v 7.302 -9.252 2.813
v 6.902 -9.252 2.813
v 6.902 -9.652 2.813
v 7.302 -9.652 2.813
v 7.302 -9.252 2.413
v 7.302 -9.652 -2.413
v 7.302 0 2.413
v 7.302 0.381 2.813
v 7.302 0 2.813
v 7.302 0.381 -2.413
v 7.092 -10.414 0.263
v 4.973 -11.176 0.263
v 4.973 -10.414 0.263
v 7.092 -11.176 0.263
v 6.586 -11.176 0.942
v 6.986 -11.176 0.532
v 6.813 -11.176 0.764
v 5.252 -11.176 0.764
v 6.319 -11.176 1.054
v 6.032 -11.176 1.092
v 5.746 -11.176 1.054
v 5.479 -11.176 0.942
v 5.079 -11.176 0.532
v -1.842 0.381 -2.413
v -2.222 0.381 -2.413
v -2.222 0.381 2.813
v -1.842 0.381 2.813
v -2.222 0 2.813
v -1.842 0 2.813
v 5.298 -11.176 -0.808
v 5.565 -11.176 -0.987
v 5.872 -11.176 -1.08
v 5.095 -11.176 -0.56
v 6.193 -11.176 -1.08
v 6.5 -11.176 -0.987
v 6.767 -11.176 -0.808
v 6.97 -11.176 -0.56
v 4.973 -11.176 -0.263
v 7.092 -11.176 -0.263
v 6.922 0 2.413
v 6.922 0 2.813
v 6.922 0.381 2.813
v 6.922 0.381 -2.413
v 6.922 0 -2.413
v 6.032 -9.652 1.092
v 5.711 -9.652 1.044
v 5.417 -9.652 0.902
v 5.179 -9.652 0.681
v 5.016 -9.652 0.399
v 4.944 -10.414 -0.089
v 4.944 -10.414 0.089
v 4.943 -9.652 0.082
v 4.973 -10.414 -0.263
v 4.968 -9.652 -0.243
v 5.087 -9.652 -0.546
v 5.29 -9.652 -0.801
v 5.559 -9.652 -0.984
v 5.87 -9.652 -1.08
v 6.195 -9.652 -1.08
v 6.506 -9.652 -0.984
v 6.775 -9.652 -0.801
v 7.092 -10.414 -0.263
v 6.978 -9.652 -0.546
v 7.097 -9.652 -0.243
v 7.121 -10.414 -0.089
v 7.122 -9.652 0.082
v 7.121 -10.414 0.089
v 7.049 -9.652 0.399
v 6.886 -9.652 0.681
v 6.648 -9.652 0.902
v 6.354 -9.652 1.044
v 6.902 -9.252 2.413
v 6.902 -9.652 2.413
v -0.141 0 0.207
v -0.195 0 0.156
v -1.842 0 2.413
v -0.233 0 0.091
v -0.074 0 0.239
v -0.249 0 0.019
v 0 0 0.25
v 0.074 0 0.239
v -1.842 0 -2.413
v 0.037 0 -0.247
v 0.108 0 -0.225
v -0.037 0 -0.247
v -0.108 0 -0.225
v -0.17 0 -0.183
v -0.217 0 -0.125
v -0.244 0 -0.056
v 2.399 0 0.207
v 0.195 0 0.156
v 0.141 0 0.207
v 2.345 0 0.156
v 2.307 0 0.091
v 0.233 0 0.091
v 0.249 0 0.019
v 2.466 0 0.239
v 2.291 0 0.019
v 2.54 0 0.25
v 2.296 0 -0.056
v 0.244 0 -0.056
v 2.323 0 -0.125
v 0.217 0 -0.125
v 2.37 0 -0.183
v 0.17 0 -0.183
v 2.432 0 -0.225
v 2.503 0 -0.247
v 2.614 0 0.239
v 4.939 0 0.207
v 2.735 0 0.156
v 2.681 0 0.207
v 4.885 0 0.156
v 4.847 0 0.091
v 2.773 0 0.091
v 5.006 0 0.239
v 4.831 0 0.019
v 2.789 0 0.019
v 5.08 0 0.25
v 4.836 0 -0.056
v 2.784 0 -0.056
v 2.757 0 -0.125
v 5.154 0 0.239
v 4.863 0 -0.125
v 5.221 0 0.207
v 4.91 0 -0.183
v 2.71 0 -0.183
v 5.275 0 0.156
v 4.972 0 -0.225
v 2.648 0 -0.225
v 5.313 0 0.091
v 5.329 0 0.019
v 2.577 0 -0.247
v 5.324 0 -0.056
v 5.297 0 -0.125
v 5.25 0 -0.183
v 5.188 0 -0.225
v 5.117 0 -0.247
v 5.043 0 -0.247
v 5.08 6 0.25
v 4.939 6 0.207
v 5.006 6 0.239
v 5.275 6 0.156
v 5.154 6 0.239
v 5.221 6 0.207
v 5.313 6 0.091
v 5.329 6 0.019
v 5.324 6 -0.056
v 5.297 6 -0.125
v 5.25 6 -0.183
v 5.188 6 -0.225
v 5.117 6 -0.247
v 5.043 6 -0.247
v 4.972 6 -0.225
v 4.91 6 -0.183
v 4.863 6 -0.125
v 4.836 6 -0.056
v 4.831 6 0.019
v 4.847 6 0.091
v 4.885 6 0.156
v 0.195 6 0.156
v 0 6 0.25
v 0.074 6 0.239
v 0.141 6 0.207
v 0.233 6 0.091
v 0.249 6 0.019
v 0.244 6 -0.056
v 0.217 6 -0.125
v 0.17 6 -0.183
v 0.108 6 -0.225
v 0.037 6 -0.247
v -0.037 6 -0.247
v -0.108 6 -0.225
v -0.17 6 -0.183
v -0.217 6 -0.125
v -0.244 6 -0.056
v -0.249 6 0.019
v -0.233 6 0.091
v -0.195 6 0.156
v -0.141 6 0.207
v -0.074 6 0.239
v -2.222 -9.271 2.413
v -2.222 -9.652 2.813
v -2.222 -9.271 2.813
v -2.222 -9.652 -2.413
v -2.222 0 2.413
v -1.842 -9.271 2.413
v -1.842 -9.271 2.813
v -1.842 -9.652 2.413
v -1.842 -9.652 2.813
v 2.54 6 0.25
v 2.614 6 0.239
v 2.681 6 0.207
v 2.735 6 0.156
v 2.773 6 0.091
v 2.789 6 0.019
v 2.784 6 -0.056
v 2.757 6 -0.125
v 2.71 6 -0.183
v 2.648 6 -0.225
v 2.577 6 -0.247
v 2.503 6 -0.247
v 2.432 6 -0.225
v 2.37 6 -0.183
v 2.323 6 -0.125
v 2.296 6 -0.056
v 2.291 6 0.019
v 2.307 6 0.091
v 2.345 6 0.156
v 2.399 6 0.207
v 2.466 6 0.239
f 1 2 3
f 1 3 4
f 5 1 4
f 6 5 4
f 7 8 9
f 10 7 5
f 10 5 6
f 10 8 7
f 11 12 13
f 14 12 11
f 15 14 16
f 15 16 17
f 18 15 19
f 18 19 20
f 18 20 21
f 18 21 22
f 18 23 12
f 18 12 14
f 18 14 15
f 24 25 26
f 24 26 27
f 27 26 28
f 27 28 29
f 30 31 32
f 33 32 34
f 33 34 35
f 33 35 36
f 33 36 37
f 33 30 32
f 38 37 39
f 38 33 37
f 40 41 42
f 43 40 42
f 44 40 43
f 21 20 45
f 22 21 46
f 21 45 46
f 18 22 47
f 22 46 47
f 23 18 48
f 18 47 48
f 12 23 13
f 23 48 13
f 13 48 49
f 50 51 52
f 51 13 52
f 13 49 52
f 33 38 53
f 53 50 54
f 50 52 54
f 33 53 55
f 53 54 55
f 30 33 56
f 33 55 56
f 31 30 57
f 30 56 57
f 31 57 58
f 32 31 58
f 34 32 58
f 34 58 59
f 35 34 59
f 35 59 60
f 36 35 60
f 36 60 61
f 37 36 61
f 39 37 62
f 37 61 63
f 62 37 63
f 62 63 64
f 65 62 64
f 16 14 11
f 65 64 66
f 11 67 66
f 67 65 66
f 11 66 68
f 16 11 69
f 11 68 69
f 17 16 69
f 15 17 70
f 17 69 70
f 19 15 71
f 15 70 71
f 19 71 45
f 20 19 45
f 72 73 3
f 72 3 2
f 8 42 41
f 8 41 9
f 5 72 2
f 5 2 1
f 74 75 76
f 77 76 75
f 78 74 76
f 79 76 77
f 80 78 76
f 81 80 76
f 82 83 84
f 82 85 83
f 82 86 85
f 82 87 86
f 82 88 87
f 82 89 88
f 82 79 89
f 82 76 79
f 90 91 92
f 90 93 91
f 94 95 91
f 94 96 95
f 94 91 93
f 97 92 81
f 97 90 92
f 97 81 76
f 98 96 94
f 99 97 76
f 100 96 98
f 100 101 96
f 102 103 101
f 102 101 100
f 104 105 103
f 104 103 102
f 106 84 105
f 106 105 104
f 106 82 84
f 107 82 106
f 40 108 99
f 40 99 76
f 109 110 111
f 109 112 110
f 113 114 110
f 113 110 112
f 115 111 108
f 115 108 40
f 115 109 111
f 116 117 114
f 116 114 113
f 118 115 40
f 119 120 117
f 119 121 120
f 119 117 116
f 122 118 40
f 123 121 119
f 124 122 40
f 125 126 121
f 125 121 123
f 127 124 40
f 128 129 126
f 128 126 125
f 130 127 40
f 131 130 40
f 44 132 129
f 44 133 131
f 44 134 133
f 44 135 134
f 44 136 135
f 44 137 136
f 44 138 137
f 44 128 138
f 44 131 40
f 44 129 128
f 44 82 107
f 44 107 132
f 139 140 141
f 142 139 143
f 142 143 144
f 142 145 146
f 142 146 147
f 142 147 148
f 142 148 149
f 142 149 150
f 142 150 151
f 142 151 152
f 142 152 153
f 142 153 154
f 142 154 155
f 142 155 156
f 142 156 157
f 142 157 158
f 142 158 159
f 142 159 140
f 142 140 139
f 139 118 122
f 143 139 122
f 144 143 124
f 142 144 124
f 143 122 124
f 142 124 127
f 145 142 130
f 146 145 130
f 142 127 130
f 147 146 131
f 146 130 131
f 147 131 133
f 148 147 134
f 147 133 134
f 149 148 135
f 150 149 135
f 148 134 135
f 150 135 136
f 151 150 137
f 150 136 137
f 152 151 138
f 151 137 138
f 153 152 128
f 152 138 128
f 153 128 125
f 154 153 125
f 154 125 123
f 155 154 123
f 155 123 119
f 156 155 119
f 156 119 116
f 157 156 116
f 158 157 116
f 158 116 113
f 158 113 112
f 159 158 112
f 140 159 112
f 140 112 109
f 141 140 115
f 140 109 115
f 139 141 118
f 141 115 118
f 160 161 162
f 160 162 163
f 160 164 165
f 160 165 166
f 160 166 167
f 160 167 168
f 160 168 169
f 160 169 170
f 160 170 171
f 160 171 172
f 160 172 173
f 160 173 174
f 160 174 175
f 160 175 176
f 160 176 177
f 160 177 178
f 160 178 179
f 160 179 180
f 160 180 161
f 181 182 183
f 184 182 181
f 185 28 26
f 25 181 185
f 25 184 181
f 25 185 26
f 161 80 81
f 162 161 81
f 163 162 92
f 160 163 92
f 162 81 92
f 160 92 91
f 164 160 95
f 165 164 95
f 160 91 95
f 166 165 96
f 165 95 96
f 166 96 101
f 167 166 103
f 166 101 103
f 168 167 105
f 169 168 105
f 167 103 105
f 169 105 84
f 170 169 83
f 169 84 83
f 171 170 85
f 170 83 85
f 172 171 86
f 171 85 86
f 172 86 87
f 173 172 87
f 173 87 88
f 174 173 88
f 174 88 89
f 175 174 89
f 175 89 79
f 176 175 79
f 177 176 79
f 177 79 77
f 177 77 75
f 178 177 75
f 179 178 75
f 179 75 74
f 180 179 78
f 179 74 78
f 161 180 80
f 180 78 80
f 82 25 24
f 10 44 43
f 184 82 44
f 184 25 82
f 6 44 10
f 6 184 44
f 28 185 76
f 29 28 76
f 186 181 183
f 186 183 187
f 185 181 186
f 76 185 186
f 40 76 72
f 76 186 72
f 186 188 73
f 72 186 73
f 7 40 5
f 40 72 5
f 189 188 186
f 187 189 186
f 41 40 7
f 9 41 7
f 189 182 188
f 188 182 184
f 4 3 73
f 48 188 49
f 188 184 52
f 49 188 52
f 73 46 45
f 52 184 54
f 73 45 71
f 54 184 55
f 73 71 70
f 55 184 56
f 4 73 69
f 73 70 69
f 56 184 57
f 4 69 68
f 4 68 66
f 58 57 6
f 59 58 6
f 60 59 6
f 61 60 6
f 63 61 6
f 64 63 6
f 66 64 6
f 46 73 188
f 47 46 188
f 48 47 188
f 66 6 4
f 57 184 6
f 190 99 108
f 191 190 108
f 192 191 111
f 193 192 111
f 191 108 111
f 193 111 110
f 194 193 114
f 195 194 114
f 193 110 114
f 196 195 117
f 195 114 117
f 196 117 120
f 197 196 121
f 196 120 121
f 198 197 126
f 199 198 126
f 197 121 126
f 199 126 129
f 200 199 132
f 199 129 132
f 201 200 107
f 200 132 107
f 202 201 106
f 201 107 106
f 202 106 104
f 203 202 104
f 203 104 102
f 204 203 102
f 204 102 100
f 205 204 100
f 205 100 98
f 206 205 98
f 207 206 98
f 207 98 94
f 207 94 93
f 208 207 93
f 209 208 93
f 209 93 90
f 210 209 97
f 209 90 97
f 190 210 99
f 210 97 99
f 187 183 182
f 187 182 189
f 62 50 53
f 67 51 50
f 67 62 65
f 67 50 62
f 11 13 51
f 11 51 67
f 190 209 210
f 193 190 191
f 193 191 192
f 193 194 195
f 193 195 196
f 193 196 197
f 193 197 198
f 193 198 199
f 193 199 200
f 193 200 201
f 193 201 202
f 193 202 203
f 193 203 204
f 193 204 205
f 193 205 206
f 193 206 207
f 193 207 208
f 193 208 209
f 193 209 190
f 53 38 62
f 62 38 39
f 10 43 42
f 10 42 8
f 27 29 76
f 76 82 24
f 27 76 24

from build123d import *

# Parameters (mm, degrees)
CROQUIS1_R                = 0.25
SALIENTE_EXTRUIR1_DEPTH   = 6
SALIENTE_EXTRUIR1_2_DEPTH = 6
SALIENTE_EXTRUIR1_3_DEPTH = 6
CROQUIS2_W                = 9.525
CROQUIS2_H                = 4.826
SALIENTE_EXTRUIR2_DEPTH   = 9.652
CROQUIS3_W                = 0.381
CROQUIS3_H                = 4.826
SALIENTE_EXTRUIR3_DEPTH   = 0.381
CROQUIS4_W                = 0.381
CROQUIS4_H                = 0.381
CROQUIS4_W_2              = 0.4
CROQUIS4_H_2              = 0.4
SALIENTE_EXTRUIR4_DEPTH   = 0.4
CROQUIS5_R                = 1.0922
SALIENTE_EXTRUIR5_DEPTH   = 1.524
CROQUIS6_W                = 2.512066748
CROQUIS6_H                = 0.526501072
CORTAR_EXTRUIR1_DEPTH     = 0.762


with BuildPart() as part:
    # Croquis1 → Saliente-Extruir1 (new body)
    with BuildSketch(Plane(origin=(0, 0, 0), x_dir=(1, 0, 0), z_dir=(0, 1, 0))):
        with Locations(Location((0, 0, 0), (0, 0, 270))):
            Circle(CROQUIS1_R)
    extrude(amount=SALIENTE_EXTRUIR1_DEPTH)



with BuildPart() as body_2:
    # Croquis1 → Saliente-Extruir1 2 (new body)
    with BuildSketch(Plane(origin=(0, 0, 0), x_dir=(1, 0, 0), z_dir=(0, 1, 0))):
        with Locations(Location((2.54, 0, 0), (0, 0, 270))):
            Circle(CROQUIS1_R)
    extrude(amount=SALIENTE_EXTRUIR1_2_DEPTH)


with BuildPart() as body_3:
    # Croquis1 → Saliente-Extruir1 3 (new body)
    with BuildSketch(Plane(origin=(0, 0, 0), x_dir=(1, 0, 0), z_dir=(0, 1, 0))):
        with Locations(Location((5.08, 0, 0), (0, 0, 270))):
            Circle(CROQUIS1_R)
    extrude(amount=SALIENTE_EXTRUIR1_3_DEPTH)


with BuildPart() as part_1:
    add(part.part)

    add(body_2.part)  # Saliente-Extruir2 merges body 2

    add(body_3.part)  # Saliente-Extruir2 merges body 3
    # Croquis2 → Saliente-Extruir2 (add)
    with BuildSketch(Plane(origin=(0, 0, 0), x_dir=(1, 0, 0), z_dir=(0, 1, 0))):
        with Locations((2.54, 0)):
            Rectangle(CROQUIS2_W, CROQUIS2_H)
    extrude(amount=-SALIENTE_EXTRUIR2_DEPTH)

    # Croquis3 → Saliente-Extruir3 (add)
    with BuildSketch(Plane(origin=(0, 0, 0), x_dir=(1, 0, 0), z_dir=(0, 1, 0))):
        with Locations((-2.032, 0)):
            Rectangle(CROQUIS3_W, CROQUIS3_H)
        with Locations((7.112, 0)):
            Rectangle(CROQUIS3_W, CROQUIS3_H)
    extrude(amount=SALIENTE_EXTRUIR3_DEPTH)

    # Croquis4 → Saliente-Extruir4 (add)
    with BuildSketch(Plane.XY.offset(2.413)):
        with Locations((-2.032, 0.1905)):
            Rectangle(CROQUIS4_W, CROQUIS4_H)
        with Locations((7.112, 0.1905)):
            Rectangle(CROQUIS4_W, CROQUIS4_H)
        with Locations((-2.032, -9.4615)):
            Rectangle(CROQUIS4_W, CROQUIS4_H)
        with Locations((7.1025, -9.452)):
            Rectangle(CROQUIS4_W_2, CROQUIS4_H_2)
    extrude(amount=SALIENTE_EXTRUIR4_DEPTH)

    # Croquis5 → Saliente-Extruir5 (add)
    with BuildSketch(Plane.XZ.offset(9.652)):
        with Locations(Location((6.0325, 0, 0), (0, 0, 90))):
            Circle(CROQUIS5_R)
    extrude(amount=SALIENTE_EXTRUIR5_DEPTH)

    # Croquis6 → Cortar-Extruir1 (cut)
    with BuildSketch(Plane.XZ.offset(11.176)):
        with Locations((6.0325, 0)):
            Rectangle(CROQUIS6_W, CROQUIS6_H)
    extrude(amount=-CORTAR_EXTRUIR1_DEPTH, mode=Mode.SUBTRACT)


solid = part_1.part
